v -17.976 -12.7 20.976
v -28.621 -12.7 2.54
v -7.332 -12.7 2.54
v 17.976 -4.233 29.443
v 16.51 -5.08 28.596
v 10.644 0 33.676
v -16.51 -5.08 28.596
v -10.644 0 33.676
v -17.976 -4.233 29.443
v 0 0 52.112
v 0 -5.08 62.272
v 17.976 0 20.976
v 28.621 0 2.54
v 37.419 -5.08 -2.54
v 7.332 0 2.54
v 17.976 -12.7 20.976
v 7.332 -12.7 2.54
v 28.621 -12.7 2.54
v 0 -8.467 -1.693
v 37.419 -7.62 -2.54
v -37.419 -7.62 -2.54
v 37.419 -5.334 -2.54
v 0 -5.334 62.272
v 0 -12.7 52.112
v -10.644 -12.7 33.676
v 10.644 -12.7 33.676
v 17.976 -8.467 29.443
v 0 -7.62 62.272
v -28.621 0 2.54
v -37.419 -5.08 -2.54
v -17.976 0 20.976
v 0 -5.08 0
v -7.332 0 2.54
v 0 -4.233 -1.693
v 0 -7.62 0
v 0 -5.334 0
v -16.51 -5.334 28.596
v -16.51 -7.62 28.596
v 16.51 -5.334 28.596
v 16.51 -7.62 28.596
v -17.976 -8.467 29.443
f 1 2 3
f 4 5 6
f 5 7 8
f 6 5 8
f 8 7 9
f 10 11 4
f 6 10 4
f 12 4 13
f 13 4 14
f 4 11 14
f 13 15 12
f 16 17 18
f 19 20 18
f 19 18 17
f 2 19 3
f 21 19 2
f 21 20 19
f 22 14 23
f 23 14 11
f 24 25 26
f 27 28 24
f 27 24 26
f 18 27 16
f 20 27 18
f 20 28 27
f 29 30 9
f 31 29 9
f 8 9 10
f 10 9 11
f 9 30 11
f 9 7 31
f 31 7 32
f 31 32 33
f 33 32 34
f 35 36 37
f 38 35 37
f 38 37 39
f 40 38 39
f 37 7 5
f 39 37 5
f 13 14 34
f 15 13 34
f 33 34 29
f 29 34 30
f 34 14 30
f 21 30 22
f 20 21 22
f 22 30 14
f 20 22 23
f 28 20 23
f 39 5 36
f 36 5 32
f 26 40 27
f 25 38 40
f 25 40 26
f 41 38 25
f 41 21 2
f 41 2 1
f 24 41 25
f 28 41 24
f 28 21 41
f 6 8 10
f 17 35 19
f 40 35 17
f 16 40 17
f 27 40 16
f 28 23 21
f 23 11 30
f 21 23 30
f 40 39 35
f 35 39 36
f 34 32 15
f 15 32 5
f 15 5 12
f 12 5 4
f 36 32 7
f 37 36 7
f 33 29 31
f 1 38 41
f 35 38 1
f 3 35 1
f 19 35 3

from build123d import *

# Parameters (mm, degrees)
F1_DEPTH      = 12.7
F2_T1_DEPTH   = 100.9671172602
F2_T3_DEPTH   = 100.9671172602
F2_T5_DEPTH   = 100.9671172602
F2_T10_DEPTH  = 59.1482991577
F2_T16_DEPTH  = 59.1482991577
F2_T22_DEPTH  = 59.1482991577
F2_T28_DEPTH  = 59.1482991577
F2_T34_DEPTH  = 59.1482991577
F2_T40_DEPTH  = 59.1482991577
F2_T47_DEPTH  = 59.1482991577
F2_T52_DEPTH  = 59.1482991577
F2_T60_DEPTH  = 59.1482991577
F2_T65_DEPTH  = 59.1482991577
F2_T73_DEPTH  = 59.1482991577
F2_T78_DEPTH  = 59.1482991577
F2_T86_DEPTH  = 59.1482991577
F2_T91_DEPTH  = 59.1482991577
F2_T99_DEPTH  = 59.1482991577
F2_T104_DEPTH = 59.1482991577
F2_T112_DEPTH = 59.1482991577
F2_T117_DEPTH = 59.1482991577
F3_DEPTH      = 2.286
F4_DEPTH      = 2.286


# Not quite as in the source:
# - a fillet or chamfer that OpenCascade refuses, or shapes differently, is made with other operations: its cross-section is extruded or revolved along the edge and cut away or added


with BuildPart() as f1:
    # F0 (on Front) → F1 (new body)
    with BuildSketch(Plane.XZ):
        Polygon((0, 57.1923176659), (-16.51, 28.596158833), (16.51, 28.596158833), align=None)
        Polygon((-33.02, 0), (0, 0), (-16.51, 28.596158833), align=None)
        Polygon((16.51, 28.596158833), (0, 0), (33.02, 0), align=None)
        Polygon((-37.4194090512, -2.54), (-33.02, 0), (-16.51, 28.596158833), (0, 57.1923176659), (0, 62.2723176659), align=None)
        Polygon((16.51, 28.596158833), (33.02, 0), (37.4194090512, -2.54), (0, 62.2723176659), (0, 57.1923176659), align=None)
        Polygon((33.02, 0), (0, 0), (-33.02, 0), (-37.4194090512, -2.54), (37.4194090512, -2.54), align=None)
    extrude(amount=F1_DEPTH)

    # F2: chamfer of 5.08 on 12 edges, made by hand

    # F2_s2 → F2_t1 (cut)
    with BuildSketch(Plane(origin=(33.496779315, 0, 58.0181236636), x_dir=(0, 1, 0), z_dir=(-0.5, 0, -0.8660254038))):
        Polygon((-7.62, -31.136158833), (-12.7, -26.056158833), (-12.7, -31.136158833), align=None)
        Polygon((-5.08, -31.136158833), (0, -26.056158833), (0, -31.136158833), align=None)
    extrude(amount=F2_T1_DEPTH, mode=Mode.SUBTRACT)

    # F2_s4 → F2_t3 (cut)
    with BuildSketch(Plane(origin=(16.986779315, 0, -29.4219648306), x_dir=(0, 1, 0), z_dir=(-0.5, 0, 0.8660254038))):
        Polygon((-7.62, -31.136158833), (-12.7, -26.056158833), (-12.7, -31.136158833), align=None)
        Polygon((-5.08, -31.136158833), (0, -26.056158833), (0, -31.136158833), align=None)
    extrude(amount=F2_T3_DEPTH, mode=Mode.SUBTRACT)

    # F2_s6 → F2_t5 (cut)
    with BuildSketch(Plane.YZ.offset(-50.4835586301)):
        Polygon((-7.62, -2.54), (-12.7, 2.54), (-12.7, -2.54), align=None)
        Polygon((-5.08, -2.54), (0, 2.54), (0, -2.54), align=None)
    extrude(amount=F2_T5_DEPTH, mode=Mode.SUBTRACT)


with BuildPart() as f2_tool8:
    # F2_s9 → F2_t10 (new body)
    with BuildSketch(Plane(origin=(6.5320747894, 0, -11.3138854141), x_dir=(0, 1, 0), z_dir=(-0.5, 0, 0.8660254038))):
        Polygon((-7.62, 0), (-12.7, 5.08), (-12.7, 0), align=None)
    extrude(amount=F2_T10_DEPTH)

    split(bisect_by=Plane(origin=(0, 0, 0), x_dir=(0, 1, 0), z_dir=(-0.8660254038, 0, 0.5)), keep=Keep.TOP)

    split(bisect_by=Plane.XY.offset(28.596158833), keep=Keep.BOTTOM)


with BuildPart() as f1_1:
    add(f1.part)

    # F2_t7: cut F2_tool8
    add(f2_tool8.part, mode=Mode.SUBTRACT)


with BuildPart() as f2_tool14:
    # F2_s15 → F2_t16 (new body)
    with BuildSketch(Plane.YZ.offset(-29.5741495789)):
        Polygon((-7.62, 28.596158833), (-12.7, 33.676158833), (-12.7, 28.596158833), align=None)
    extrude(amount=F2_T16_DEPTH)

    split(bisect_by=Plane(origin=(0, 0, 0), x_dir=(0, 1, 0), z_dir=(-0.8660254038, 0, 0.5)), keep=Keep.TOP)

    split(bisect_by=Plane(origin=(0, 0, 0), x_dir=(0, 1, 0), z_dir=(0.8660254038, 0, 0.5)), keep=Keep.TOP)


with BuildPart() as f1_2:
    add(f1_1.part)

    # F2_t13: cut F2_tool14
    add(f2_tool14.part, mode=Mode.SUBTRACT)


with BuildPart() as f2_tool20:
    # F2_s21 → F2_t22 (new body)
    with BuildSketch(Plane(origin=(23.0420747894, 0, 39.9100442471), x_dir=(0, 1, 0), z_dir=(-0.5, 0, -0.8660254038))):
        Polygon((-7.62, 0), (-12.7, 5.08), (-12.7, 0), align=None)
    extrude(amount=F2_T22_DEPTH)

    split(bisect_by=Plane(origin=(0, 0, 0), x_dir=(0, 1, 0), z_dir=(0.8660254038, 0, 0.5)), keep=Keep.TOP)

    split(bisect_by=Plane.XY.offset(28.596158833), keep=Keep.BOTTOM)


with BuildPart() as f1_3:
    add(f1_2.part)

    # F2_t19: cut F2_tool20
    add(f2_tool20.part, mode=Mode.SUBTRACT)


with BuildPart() as f2_tool26:
    # F2_s27 → F2_t28 (new body)
    with BuildSketch(Plane(origin=(23.0420747894, 0, 39.9100442471), x_dir=(0, 1, 0), z_dir=(-0.5, 0, -0.8660254038))):
        Polygon((-5.08, 0), (0, 5.08), (0, 0), align=None)
    extrude(amount=F2_T28_DEPTH)

    split(bisect_by=Plane(origin=(0, 0, 0), x_dir=(0, 1, 0), z_dir=(0.8660254038, 0, 0.5)), keep=Keep.TOP)

    split(bisect_by=Plane.XY.offset(28.596158833), keep=Keep.BOTTOM)


with BuildPart() as f1_4:
    add(f1_3.part)

    # F2_t25: cut F2_tool26
    add(f2_tool26.part, mode=Mode.SUBTRACT)


with BuildPart() as f2_tool32:
    # F2_s33 → F2_t34 (new body)
    with BuildSketch(Plane.YZ.offset(-29.5741495789)):
        Polygon((-5.08, 28.596158833), (0, 33.676158833), (0, 28.596158833), align=None)
    extrude(amount=F2_T34_DEPTH)

    split(bisect_by=Plane(origin=(0, 0, 0), x_dir=(0, 1, 0), z_dir=(-0.8660254038, 0, 0.5)), keep=Keep.TOP)

    split(bisect_by=Plane(origin=(0, 0, 0), x_dir=(0, 1, 0), z_dir=(0.8660254038, 0, 0.5)), keep=Keep.TOP)


with BuildPart() as f1_5:
    add(f1_4.part)

    # F2_t31: cut F2_tool32
    add(f2_tool32.part, mode=Mode.SUBTRACT)


with BuildPart() as f2_tool38:
    # F2_s39 → F2_t40 (new body)
    with BuildSketch(Plane(origin=(6.5320747894, 0, -11.3138854141), x_dir=(0, 1, 0), z_dir=(-0.5, 0, 0.8660254038))):
        Polygon((-5.08, 0), (0, 5.08), (0, 0), align=None)
    extrude(amount=F2_T40_DEPTH)

    split(bisect_by=Plane(origin=(0, 0, 0), x_dir=(0, 1, 0), z_dir=(-0.8660254038, 0, 0.5)), keep=Keep.TOP)

    split(bisect_by=Plane.XY.offset(28.596158833), keep=Keep.BOTTOM)


with BuildPart() as f1_6:
    add(f1_5.part)

    # F2_t37: cut F2_tool38
    add(f2_tool38.part, mode=Mode.SUBTRACT)


with BuildPart() as f2_tool45:
    # F2_s46 → F2_t47 (new body)
    with BuildSketch(Plane(origin=(23.0420747894, 0, 39.9100442471), x_dir=(0, 1, 0), z_dir=(-0.5, 0, -0.8660254038))):
        Polygon((-7.62, 0), (-12.7, 5.08), (-12.7, 0), align=None)
    extrude(amount=F2_T47_DEPTH)

    split(bisect_by=Plane.XY.offset(-2.54), keep=Keep.TOP)

    split(bisect_by=Plane(origin=(0, 0, 0), x_dir=(0, 1, 0), z_dir=(-0.8660254038, 0, -0.5)), keep=Keep.TOP)


with BuildPart() as f2_tool50:
    # F2_s51 → F2_t52 (new body)
    with BuildSketch(Plane(origin=(6.5320747894, 0, -11.3138854141), x_dir=(0, 1, 0), z_dir=(-0.5, 0, 0.8660254038))):
        Polygon((-7.62, 0), (-12.7, 5.08), (-12.7, 0), align=None)
    extrude(amount=F2_T52_DEPTH)

    split(bisect_by=Plane.XY.offset(-2.54), keep=Keep.TOP)

    split(bisect_by=Plane(origin=(0, 0, 0), x_dir=(0, 1, 0), z_dir=(0.8660254038, 0, -0.5)), keep=Keep.TOP)


with BuildPart() as f2_tool45_1:
    add(f2_tool45.part)

    # F2_t55: intersect F2_tool50
    add(f2_tool50.part, mode=Mode.INTERSECT)


with BuildPart() as f1_7:
    add(f1_6.part)

    # F2_t43: cut F2_tool45
    add(f2_tool45_1.part, mode=Mode.SUBTRACT)


with BuildPart() as f2_tool58:
    # F2_s59 → F2_t60 (new body)
    with BuildSketch(Plane(origin=(6.5320747894, 0, -11.3138854141), x_dir=(0, 1, 0), z_dir=(-0.5, 0, 0.8660254038))):
        Polygon((-7.62, 0), (-12.7, 5.08), (-12.7, 0), align=None)
    extrude(amount=F2_T60_DEPTH)

    split(bisect_by=Plane(origin=(-26.9647045256, 0, 15.5680794165), x_dir=(0, 1, 0), z_dir=(0.8660254038, 0, -0.5)), keep=Keep.TOP)

    split(bisect_by=Plane.XY.offset(28.596158833), keep=Keep.TOP)


with BuildPart() as f2_tool63:
    # F2_s64 → F2_t65 (new body)
    with BuildSketch(Plane.YZ.offset(-29.5741495789)):
        Polygon((-7.62, 28.596158833), (-12.7, 33.676158833), (-12.7, 28.596158833), align=None)
    extrude(amount=F2_T65_DEPTH)

    split(bisect_by=Plane(origin=(-26.9647045256, 0, 15.5680794165), x_dir=(0, 1, 0), z_dir=(0.8660254038, 0, -0.5)), keep=Keep.TOP)

    split(bisect_by=Plane(origin=(0, 0, 0), x_dir=(0, 1, 0), z_dir=(-0.8660254038, 0, -0.5)), keep=Keep.TOP)


with BuildPart() as f2_tool58_1:
    add(f2_tool58.part)

    # F2_t68: intersect F2_tool63
    add(f2_tool63.part, mode=Mode.INTERSECT)


with BuildPart() as f1_8:
    add(f1_7.part)

    # F2_t56: cut F2_tool58
    add(f2_tool58_1.part, mode=Mode.SUBTRACT)


with BuildPart() as f2_tool71:
    # F2_s72 → F2_t73 (new body)
    with BuildSketch(Plane(origin=(23.0420747894, 0, 39.9100442471), x_dir=(0, 1, 0), z_dir=(-0.5, 0, -0.8660254038))):
        Polygon((-7.62, 0), (-12.7, 5.08), (-12.7, 0), align=None)
    extrude(amount=F2_T73_DEPTH)

    split(bisect_by=Plane(origin=(26.9647045256, 0, 15.5680794165), x_dir=(0, 1, 0), z_dir=(-0.8660254038, 0, -0.5)), keep=Keep.TOP)

    split(bisect_by=Plane.XY.offset(28.596158833), keep=Keep.TOP)


with BuildPart() as f2_tool76:
    # F2_s77 → F2_t78 (new body)
    with BuildSketch(Plane.YZ.offset(-29.5741495789)):
        Polygon((-7.62, 28.596158833), (-12.7, 33.676158833), (-12.7, 28.596158833), align=None)
    extrude(amount=F2_T78_DEPTH)

    split(bisect_by=Plane(origin=(26.9647045256, 0, 15.5680794165), x_dir=(0, 1, 0), z_dir=(-0.8660254038, 0, -0.5)), keep=Keep.TOP)

    split(bisect_by=Plane(origin=(0, 0, 0), x_dir=(0, 1, 0), z_dir=(0.8660254038, 0, -0.5)), keep=Keep.TOP)


with BuildPart() as f2_tool71_1:
    add(f2_tool71.part)

    # F2_t81: intersect F2_tool76
    add(f2_tool76.part, mode=Mode.INTERSECT)


with BuildPart() as f1_9:
    add(f1_8.part)

    # F2_t69: cut F2_tool71
    add(f2_tool71_1.part, mode=Mode.SUBTRACT)


with BuildPart() as f2_tool84:
    # F2_s85 → F2_t86 (new body)
    with BuildSketch(Plane(origin=(23.0420747894, 0, 39.9100442471), x_dir=(0, 1, 0), z_dir=(-0.5, 0, -0.8660254038))):
        Polygon((-5.08, 0), (0, 5.08), (0, 0), align=None)
    extrude(amount=F2_T86_DEPTH)

    split(bisect_by=Plane(origin=(26.9647045256, 0, 15.5680794165), x_dir=(0, 1, 0), z_dir=(-0.8660254038, 0, -0.5)), keep=Keep.TOP)

    split(bisect_by=Plane.XY.offset(28.596158833), keep=Keep.TOP)


with BuildPart() as f2_tool89:
    # F2_s90 → F2_t91 (new body)
    with BuildSketch(Plane.YZ.offset(-29.5741495789)):
        Polygon((-5.08, 28.596158833), (0, 33.676158833), (0, 28.596158833), align=None)
    extrude(amount=F2_T91_DEPTH)

    split(bisect_by=Plane(origin=(26.9647045256, 0, 15.5680794165), x_dir=(0, 1, 0), z_dir=(-0.8660254038, 0, -0.5)), keep=Keep.TOP)

    split(bisect_by=Plane(origin=(0, 0, 0), x_dir=(0, 1, 0), z_dir=(0.8660254038, 0, -0.5)), keep=Keep.TOP)


with BuildPart() as f2_tool84_1:
    add(f2_tool84.part)

    # F2_t94: intersect F2_tool89
    add(f2_tool89.part, mode=Mode.INTERSECT)


with BuildPart() as f1_10:
    add(f1_9.part)

    # F2_t82: cut F2_tool84
    add(f2_tool84_1.part, mode=Mode.SUBTRACT)


with BuildPart() as f2_tool97:
    # F2_s98 → F2_t99 (new body)
    with BuildSketch(Plane(origin=(23.0420747894, 0, 39.9100442471), x_dir=(0, 1, 0), z_dir=(-0.5, 0, -0.8660254038))):
        Polygon((-5.08, 0), (0, 5.08), (0, 0), align=None)
    extrude(amount=F2_T99_DEPTH)

    split(bisect_by=Plane.XY.offset(-2.54), keep=Keep.TOP)

    split(bisect_by=Plane(origin=(0, 0, 0), x_dir=(0, 1, 0), z_dir=(-0.8660254038, 0, -0.5)), keep=Keep.TOP)


with BuildPart() as f2_tool102:
    # F2_s103 → F2_t104 (new body)
    with BuildSketch(Plane(origin=(6.5320747894, 0, -11.3138854141), x_dir=(0, 1, 0), z_dir=(-0.5, 0, 0.8660254038))):
        Polygon((-5.08, 0), (0, 5.08), (0, 0), align=None)
    extrude(amount=F2_T104_DEPTH)

    split(bisect_by=Plane.XY.offset(-2.54), keep=Keep.TOP)

    split(bisect_by=Plane(origin=(0, 0, 0), x_dir=(0, 1, 0), z_dir=(0.8660254038, 0, -0.5)), keep=Keep.TOP)


with BuildPart() as f2_tool97_1:
    add(f2_tool97.part)

    # F2_t107: intersect F2_tool102
    add(f2_tool102.part, mode=Mode.INTERSECT)


with BuildPart() as f1_11:
    add(f1_10.part)

    # F2_t95: cut F2_tool97
    add(f2_tool97_1.part, mode=Mode.SUBTRACT)


with BuildPart() as f2_tool110:
    # F2_s111 → F2_t112 (new body)
    with BuildSketch(Plane(origin=(6.5320747894, 0, -11.3138854141), x_dir=(0, 1, 0), z_dir=(-0.5, 0, 0.8660254038))):
        Polygon((-5.08, 0), (0, 5.08), (0, 0), align=None)
    extrude(amount=F2_T112_DEPTH)

    split(bisect_by=Plane(origin=(-26.9647045256, 0, 15.5680794165), x_dir=(0, 1, 0), z_dir=(0.8660254038, 0, -0.5)), keep=Keep.TOP)

    split(bisect_by=Plane.XY.offset(28.596158833), keep=Keep.TOP)


with BuildPart() as f2_tool115:
    # F2_s116 → F2_t117 (new body)
    with BuildSketch(Plane.YZ.offset(-29.5741495789)):
        Polygon((-5.08, 28.596158833), (0, 33.676158833), (0, 28.596158833), align=None)
    extrude(amount=F2_T117_DEPTH)

    split(bisect_by=Plane(origin=(-26.9647045256, 0, 15.5680794165), x_dir=(0, 1, 0), z_dir=(0.8660254038, 0, -0.5)), keep=Keep.TOP)

    split(bisect_by=Plane(origin=(0, 0, 0), x_dir=(0, 1, 0), z_dir=(-0.8660254038, 0, -0.5)), keep=Keep.TOP)


with BuildPart() as f2_tool110_1:
    add(f2_tool110.part)

    # F2_t120: intersect F2_tool115
    add(f2_tool115.part, mode=Mode.INTERSECT)


with BuildPart() as f1_12:
    add(f1_11.part)

    # F2_t108: cut F2_tool110
    add(f2_tool110_1.part, mode=Mode.SUBTRACT)

    # F3 (cut): faces of the model
    f3_faces = [f1_12.faces().sort_by_distance(p)[0] for p in [
        (-17.9764696838, -12.7, 8.6853862777),
        (-10.2690242997, -9.9455949432, 13.1352819449),
        (0, -9.9455949432, 30.9217537762),
        (-17.9764696838, -12.7, 8.6853862777),
        (10.2690242997, -9.9455949432, 13.1352819449),
        (-17.9764696838, -12.7, 8.6853862777),
        (10.2690242997, -9.9455949432, 13.1352819449),
        (23.7578772071, -12.1695918979, 12.0232834675),
        (-10.2690242997, -9.9455949432, 13.1352819449),
    ]]
    extrude(f3_faces, amount=-F3_DEPTH, dir=(0, -1, 0), mode=Mode.SUBTRACT)

    # F4 (add): faces of the model
    f4_faces = [f1_12.faces().sort_by_distance(p)[0] for p in [
        (-17.9764696838, -10.414, 8.6853862777),
        (-17.9764696838, -10.414, 8.6853862777),
        (-10.2690242997, -7.6595949432, 13.1352819449),
        (-17.9764696838, -10.414, 8.6853862777),
        (10.2690242997, -7.6595949432, 13.1352819449),
        (-10.2690242997, -7.6595949432, 13.1352819449),
        (0, -7.6595949432, 30.9217537762),
        (10.2690242997, -7.6595949432, 13.1352819449),
        (23.7578772071, -9.8835918979, 12.0232834675),
    ]]
    extrude(f4_faces, amount=F4_DEPTH, dir=(0, -1, 0))


solid = f1_12.part
